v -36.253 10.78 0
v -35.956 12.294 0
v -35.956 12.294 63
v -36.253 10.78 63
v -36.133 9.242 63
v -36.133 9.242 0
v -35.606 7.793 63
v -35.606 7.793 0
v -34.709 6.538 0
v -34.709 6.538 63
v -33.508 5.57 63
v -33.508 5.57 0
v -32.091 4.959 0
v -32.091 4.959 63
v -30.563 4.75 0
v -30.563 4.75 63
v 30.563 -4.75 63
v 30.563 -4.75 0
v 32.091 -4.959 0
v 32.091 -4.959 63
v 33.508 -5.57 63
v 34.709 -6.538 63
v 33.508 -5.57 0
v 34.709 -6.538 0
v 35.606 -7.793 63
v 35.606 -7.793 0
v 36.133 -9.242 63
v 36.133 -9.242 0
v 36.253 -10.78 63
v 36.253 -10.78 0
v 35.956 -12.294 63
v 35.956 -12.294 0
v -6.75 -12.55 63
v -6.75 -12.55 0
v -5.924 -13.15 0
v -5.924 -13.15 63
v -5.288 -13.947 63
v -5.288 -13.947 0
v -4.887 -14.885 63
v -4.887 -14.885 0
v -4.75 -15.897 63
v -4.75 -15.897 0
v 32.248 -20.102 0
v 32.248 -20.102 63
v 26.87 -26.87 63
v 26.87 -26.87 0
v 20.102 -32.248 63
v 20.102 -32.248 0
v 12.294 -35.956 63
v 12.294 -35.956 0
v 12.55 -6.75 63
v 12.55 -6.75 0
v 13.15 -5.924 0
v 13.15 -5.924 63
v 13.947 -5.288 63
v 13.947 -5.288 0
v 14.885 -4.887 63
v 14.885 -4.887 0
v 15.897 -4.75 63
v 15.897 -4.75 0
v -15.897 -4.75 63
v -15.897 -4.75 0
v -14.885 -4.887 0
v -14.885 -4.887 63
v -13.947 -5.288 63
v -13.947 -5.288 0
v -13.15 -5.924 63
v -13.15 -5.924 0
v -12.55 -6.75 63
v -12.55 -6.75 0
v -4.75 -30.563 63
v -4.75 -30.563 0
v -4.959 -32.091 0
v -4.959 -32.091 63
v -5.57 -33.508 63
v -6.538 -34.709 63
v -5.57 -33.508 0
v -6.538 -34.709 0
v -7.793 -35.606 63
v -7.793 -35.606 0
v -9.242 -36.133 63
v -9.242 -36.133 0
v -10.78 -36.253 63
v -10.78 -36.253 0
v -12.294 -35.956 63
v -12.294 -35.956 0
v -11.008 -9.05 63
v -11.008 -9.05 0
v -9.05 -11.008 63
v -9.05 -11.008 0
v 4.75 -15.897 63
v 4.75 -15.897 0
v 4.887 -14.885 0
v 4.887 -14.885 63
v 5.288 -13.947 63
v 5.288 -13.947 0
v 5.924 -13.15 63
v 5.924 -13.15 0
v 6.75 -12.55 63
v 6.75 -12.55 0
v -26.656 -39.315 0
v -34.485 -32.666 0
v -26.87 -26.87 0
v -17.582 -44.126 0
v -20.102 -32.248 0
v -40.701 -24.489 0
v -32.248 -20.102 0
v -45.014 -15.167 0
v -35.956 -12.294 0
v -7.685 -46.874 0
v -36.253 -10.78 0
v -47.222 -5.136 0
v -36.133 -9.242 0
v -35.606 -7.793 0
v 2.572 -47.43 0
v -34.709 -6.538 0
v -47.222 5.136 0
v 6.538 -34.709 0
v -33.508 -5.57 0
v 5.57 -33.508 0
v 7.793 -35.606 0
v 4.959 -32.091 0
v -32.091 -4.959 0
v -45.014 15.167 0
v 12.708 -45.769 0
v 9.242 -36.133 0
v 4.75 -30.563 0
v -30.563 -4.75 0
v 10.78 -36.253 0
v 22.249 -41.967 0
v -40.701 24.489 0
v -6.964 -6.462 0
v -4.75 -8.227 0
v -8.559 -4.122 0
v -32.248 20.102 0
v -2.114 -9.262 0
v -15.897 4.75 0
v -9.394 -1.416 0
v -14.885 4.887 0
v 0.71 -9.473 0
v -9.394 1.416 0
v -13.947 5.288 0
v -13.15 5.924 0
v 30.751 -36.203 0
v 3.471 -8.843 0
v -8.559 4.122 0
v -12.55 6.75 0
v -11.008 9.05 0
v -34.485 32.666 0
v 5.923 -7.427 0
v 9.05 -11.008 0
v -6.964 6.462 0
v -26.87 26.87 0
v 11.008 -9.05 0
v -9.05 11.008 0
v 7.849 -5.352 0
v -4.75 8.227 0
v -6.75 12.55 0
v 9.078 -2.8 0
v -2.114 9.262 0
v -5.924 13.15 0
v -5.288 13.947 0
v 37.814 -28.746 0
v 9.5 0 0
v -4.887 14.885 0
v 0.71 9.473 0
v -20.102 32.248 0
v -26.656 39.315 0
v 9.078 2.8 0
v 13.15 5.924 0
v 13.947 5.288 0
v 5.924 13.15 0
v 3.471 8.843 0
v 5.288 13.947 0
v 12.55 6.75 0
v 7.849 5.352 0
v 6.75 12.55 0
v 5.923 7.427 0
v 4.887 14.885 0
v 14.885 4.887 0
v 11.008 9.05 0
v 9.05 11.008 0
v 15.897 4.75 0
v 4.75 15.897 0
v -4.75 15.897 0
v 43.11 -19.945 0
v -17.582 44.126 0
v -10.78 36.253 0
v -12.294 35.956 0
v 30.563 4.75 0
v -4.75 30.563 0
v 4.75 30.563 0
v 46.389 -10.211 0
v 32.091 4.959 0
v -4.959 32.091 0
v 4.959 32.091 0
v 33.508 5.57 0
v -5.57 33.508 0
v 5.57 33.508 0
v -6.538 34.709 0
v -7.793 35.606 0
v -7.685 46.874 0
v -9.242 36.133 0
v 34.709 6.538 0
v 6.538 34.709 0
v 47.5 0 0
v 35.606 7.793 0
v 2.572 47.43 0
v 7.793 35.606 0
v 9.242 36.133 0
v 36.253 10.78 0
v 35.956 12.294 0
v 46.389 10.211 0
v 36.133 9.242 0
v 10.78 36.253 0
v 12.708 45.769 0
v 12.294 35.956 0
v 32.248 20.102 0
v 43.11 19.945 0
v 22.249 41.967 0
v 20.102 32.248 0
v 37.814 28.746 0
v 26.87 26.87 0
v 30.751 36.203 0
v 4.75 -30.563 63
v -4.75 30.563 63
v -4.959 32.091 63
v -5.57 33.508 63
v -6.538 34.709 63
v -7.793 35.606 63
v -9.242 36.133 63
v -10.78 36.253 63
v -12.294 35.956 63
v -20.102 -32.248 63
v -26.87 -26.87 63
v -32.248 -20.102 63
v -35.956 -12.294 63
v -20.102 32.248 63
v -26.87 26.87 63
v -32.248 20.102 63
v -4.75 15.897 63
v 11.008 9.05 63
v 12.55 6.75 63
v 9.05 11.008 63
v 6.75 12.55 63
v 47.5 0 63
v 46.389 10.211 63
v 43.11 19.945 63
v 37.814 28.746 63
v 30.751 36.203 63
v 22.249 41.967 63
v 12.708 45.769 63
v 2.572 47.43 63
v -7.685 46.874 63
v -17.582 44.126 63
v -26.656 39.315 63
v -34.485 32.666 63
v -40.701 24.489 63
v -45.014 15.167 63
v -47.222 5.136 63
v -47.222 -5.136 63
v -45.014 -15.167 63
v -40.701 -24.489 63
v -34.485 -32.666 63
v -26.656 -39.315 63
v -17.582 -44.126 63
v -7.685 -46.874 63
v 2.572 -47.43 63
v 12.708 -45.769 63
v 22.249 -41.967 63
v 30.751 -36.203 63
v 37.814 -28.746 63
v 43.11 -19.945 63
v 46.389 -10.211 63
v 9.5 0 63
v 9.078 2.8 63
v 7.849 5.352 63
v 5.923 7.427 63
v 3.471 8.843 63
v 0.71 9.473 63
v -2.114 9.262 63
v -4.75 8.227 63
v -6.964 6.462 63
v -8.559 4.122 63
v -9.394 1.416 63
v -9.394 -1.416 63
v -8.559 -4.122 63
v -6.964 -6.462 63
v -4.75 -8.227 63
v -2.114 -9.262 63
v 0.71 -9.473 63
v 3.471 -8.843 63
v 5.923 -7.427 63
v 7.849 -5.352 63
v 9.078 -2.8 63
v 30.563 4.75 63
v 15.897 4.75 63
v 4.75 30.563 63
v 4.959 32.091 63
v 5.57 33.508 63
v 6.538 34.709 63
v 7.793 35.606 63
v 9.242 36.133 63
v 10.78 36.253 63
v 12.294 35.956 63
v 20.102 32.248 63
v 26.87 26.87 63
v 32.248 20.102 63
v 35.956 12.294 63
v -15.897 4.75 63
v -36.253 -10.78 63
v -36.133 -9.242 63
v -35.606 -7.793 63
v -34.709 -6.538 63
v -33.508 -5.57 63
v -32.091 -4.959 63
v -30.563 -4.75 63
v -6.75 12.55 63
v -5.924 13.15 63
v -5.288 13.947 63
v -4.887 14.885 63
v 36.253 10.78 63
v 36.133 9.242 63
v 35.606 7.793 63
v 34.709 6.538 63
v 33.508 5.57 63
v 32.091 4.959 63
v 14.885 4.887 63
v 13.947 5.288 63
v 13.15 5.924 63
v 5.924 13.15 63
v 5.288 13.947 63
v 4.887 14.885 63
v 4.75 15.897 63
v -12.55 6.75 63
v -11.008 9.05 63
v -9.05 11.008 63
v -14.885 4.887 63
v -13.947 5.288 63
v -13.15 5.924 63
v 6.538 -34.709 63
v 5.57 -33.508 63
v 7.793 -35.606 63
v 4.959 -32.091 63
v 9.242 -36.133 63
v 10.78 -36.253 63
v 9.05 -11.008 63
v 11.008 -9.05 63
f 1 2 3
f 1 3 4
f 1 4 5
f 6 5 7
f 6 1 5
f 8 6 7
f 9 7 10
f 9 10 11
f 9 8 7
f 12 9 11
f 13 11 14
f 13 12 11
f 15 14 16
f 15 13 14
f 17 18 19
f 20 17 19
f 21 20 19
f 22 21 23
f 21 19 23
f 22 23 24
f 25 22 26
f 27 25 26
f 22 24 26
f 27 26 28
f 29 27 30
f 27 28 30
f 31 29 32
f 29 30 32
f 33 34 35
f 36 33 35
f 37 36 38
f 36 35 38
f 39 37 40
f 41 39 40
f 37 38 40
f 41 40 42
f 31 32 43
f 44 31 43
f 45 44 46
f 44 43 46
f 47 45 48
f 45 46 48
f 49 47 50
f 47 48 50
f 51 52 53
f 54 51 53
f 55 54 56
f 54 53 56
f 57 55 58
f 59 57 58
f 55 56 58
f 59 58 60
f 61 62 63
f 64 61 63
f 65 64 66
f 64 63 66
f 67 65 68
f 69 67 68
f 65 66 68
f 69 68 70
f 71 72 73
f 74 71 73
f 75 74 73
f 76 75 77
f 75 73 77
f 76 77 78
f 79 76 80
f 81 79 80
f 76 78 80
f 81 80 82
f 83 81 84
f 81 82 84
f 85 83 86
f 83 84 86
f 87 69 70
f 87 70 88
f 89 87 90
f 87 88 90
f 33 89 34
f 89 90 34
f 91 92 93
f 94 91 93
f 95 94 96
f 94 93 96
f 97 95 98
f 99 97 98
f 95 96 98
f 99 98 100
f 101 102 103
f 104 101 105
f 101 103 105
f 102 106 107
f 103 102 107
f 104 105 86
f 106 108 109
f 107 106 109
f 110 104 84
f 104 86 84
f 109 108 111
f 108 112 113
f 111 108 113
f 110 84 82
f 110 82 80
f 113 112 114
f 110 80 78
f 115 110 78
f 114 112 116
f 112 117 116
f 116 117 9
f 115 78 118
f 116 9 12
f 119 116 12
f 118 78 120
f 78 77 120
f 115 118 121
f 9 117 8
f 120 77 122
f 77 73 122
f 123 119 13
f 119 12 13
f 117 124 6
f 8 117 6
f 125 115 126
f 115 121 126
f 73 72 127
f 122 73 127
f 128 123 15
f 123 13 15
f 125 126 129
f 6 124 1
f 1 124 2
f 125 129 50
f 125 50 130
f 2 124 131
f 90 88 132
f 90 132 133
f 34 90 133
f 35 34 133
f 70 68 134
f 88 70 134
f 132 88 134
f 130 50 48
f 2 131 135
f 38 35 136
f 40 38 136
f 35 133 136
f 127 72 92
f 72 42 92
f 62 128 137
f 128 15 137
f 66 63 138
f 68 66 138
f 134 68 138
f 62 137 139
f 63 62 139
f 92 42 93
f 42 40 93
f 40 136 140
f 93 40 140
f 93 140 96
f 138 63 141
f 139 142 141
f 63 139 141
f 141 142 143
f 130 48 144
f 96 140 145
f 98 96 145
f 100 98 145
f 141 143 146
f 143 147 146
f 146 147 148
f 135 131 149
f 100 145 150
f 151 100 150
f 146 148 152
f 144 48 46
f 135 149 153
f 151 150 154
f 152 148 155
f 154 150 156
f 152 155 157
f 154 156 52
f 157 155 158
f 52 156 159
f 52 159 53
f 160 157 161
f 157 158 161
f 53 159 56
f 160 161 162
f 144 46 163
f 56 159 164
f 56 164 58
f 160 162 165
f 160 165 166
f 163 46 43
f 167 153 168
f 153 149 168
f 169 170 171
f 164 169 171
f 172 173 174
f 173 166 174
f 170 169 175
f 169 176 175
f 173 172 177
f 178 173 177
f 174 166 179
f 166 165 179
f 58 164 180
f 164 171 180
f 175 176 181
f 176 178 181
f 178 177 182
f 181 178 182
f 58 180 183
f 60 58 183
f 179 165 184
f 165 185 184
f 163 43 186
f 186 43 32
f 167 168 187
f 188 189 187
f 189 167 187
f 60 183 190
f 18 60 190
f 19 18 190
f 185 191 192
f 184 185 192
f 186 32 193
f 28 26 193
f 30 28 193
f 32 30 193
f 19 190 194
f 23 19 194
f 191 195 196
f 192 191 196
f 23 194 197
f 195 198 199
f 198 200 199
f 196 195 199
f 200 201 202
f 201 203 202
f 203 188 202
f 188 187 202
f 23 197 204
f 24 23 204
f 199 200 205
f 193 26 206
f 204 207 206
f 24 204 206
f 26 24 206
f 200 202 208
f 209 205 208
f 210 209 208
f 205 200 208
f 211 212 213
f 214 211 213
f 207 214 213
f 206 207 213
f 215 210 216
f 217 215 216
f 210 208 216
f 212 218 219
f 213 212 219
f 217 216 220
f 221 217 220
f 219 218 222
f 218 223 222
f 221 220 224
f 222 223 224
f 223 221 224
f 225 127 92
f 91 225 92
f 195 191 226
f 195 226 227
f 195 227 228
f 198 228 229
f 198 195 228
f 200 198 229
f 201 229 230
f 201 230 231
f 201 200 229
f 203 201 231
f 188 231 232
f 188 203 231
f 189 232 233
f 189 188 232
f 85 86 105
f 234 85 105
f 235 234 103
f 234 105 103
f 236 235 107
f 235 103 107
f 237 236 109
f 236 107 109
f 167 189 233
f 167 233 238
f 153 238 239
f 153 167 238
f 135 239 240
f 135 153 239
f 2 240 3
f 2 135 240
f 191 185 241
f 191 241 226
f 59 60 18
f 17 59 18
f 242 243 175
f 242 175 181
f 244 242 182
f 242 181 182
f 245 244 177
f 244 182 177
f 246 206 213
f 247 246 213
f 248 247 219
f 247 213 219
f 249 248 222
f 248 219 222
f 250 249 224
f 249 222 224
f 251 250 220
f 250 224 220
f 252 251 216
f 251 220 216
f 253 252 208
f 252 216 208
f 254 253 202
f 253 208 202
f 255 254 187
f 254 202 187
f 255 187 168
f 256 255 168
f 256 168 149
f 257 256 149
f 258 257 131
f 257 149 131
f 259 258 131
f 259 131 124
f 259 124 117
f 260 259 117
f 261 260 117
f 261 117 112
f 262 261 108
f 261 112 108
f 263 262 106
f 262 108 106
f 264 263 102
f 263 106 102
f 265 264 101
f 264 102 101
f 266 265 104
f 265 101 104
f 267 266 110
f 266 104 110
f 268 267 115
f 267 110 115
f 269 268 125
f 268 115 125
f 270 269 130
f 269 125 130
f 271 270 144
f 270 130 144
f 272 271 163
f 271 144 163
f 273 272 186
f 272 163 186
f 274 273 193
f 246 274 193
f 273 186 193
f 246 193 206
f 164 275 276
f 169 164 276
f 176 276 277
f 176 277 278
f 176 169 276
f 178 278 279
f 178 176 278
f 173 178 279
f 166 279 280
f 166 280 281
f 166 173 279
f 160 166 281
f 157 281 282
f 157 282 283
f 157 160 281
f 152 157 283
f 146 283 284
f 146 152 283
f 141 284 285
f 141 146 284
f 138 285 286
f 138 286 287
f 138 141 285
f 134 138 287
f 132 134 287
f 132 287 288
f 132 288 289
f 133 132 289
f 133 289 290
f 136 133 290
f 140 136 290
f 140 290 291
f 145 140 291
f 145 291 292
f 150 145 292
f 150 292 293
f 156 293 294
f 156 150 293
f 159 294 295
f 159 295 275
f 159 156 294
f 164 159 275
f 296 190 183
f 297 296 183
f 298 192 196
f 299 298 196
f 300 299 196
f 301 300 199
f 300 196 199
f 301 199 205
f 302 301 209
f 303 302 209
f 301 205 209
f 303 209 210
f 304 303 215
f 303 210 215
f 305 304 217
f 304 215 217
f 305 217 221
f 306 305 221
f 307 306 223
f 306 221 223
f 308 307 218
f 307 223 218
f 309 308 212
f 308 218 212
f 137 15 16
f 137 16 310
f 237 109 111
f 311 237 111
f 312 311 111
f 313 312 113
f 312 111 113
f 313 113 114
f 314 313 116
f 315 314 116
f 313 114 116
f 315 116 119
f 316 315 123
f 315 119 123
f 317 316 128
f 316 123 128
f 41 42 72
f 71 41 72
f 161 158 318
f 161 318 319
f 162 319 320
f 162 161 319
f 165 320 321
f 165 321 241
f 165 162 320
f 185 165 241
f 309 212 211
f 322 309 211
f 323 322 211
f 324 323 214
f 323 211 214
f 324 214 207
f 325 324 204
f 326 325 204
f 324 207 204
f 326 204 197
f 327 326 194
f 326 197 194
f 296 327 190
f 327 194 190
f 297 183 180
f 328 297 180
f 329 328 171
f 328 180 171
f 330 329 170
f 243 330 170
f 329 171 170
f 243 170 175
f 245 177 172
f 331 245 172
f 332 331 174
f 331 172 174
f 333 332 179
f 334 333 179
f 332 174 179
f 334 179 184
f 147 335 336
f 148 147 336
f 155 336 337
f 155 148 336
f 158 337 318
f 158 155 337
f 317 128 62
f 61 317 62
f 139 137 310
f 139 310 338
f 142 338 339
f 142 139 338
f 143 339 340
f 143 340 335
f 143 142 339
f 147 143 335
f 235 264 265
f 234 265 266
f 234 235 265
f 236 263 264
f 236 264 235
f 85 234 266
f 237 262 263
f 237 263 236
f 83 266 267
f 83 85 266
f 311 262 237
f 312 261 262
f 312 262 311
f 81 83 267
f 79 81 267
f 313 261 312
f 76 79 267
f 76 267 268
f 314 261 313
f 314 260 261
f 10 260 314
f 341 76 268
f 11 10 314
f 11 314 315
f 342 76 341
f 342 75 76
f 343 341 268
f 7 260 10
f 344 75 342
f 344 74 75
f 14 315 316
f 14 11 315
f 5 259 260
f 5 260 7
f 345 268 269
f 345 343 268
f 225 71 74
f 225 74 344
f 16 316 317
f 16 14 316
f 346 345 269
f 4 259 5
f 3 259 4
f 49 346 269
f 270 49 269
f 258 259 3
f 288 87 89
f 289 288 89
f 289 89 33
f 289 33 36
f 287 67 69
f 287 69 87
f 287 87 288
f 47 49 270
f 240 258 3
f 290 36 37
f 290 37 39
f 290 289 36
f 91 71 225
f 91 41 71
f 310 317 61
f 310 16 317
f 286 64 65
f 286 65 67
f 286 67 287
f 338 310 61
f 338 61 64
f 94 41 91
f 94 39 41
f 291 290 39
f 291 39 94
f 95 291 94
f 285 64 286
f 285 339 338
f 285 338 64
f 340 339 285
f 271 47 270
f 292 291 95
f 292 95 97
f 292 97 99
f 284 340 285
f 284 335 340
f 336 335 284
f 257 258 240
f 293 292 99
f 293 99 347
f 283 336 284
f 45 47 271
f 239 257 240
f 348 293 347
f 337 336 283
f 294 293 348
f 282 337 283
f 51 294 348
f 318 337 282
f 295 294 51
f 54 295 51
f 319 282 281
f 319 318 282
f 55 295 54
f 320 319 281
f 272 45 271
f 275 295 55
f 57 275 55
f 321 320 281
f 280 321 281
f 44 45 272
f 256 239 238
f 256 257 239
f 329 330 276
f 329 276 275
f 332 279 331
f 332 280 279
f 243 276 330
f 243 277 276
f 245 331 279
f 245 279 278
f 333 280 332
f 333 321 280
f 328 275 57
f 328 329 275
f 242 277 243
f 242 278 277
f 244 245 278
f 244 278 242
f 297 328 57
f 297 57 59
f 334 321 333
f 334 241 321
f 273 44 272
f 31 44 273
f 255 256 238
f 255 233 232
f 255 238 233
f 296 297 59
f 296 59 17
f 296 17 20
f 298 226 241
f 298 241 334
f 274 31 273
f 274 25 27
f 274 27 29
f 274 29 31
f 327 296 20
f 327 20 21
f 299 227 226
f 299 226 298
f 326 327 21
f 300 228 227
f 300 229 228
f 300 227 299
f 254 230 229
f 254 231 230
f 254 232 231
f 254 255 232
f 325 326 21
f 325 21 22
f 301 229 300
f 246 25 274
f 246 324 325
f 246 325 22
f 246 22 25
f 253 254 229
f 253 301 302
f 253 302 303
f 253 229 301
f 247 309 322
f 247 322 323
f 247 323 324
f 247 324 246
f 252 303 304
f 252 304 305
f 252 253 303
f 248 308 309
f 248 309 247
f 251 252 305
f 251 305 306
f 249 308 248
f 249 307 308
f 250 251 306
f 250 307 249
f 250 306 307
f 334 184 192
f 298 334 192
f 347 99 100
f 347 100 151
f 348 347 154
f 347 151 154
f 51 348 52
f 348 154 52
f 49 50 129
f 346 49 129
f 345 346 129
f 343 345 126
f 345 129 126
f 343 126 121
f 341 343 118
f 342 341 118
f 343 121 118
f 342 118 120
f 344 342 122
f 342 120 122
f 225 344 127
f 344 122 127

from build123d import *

# Parameters (mm, degrees)
IZIM1_R                     = 47.5
IZIM1_R_2                   = 9.5
Y_KSEKLIK_EKSTR_ZYON1_DEPTH = 63


with BuildPart() as part:
    # Çizim1 → Yükseklik-Ekstrüzyon1 (new body)
    with BuildSketch(Plane.XY):
        Circle(IZIM1_R)
        Circle(IZIM1_R_2, mode=Mode.SUBTRACT)
        with BuildLine():
            Line((30.56284509, 4.75), (15.896540504, 4.75))
            ThreePointArc((15.896540504, 4.75), (13.947181635, 5.288098714), (12.549900398, 6.75))
            ThreePointArc((12.549900398, 6.75), (10.076271632, 10.076271632), (6.75, 12.549900398))
            ThreePointArc((6.75, 12.549900398), (5.288098714, 13.947181635), (4.75, 15.896540504))
            Line((4.75, 15.896540504), (4.75, 30.56284509))
            ThreePointArc((4.75, 30.56284509), (7.134994011, 35.199733626), (12.294117647, 35.956288341))
            ThreePointArc((12.294117647, 35.956288341), (26.870057685, 26.870057685), (35.956288341, 12.294117647))
            ThreePointArc((35.956288341, 12.294117647), (35.199733626, 7.134994011), (30.56284509, 4.75))
        make_face(mode=Mode.SUBTRACT)
        with BuildLine():
            Line((-30.56284509, 4.75), (-15.896540504, 4.75))
            ThreePointArc((-15.896540504, 4.75), (-13.947181635, 5.288098714), (-12.549900398, 6.75))
            ThreePointArc((-12.549900398, 6.75), (-10.076271632, 10.076271632), (-6.75, 12.549900398))
            ThreePointArc((-6.75, 12.549900398), (-5.288098714, 13.947181635), (-4.75, 15.896540504))
            Line((-4.75, 15.896540504), (-4.75, 30.56284509))
            ThreePointArc((-4.75, 30.56284509), (-7.134994011, 35.199733626), (-12.294117647, 35.956288341))
            ThreePointArc((-12.294117647, 35.956288341), (-26.870057685, 26.870057685), (-35.956288341, 12.294117647))
            ThreePointArc((-35.956288341, 12.294117647), (-35.199733626, 7.134994011), (-30.56284509, 4.75))
        make_face(mode=Mode.SUBTRACT)
        with BuildLine():
            Line((4.75, -30.56284509), (4.75, -15.896540504))
            ThreePointArc((4.75, -15.896540504), (5.288098714, -13.947181635), (6.75, -12.549900398))
            ThreePointArc((6.75, -12.549900398), (10.076271632, -10.076271632), (12.549900398, -6.75))
            ThreePointArc((12.549900398, -6.75), (13.947181635, -5.288098714), (15.896540504, -4.75))
            Line((15.896540504, -4.75), (30.56284509, -4.75))
            ThreePointArc((30.56284509, -4.75), (35.199733626, -7.134994011), (35.956288341, -12.294117647))
            ThreePointArc((35.956288341, -12.294117647), (26.870057685, -26.870057685), (12.294117647, -35.956288341))
            ThreePointArc((12.294117647, -35.956288341), (7.134994011, -35.199733626), (4.75, -30.56284509))
        make_face(mode=Mode.SUBTRACT)
        with BuildLine():
            Line((-30.56284509, -4.75), (-15.896540504, -4.75))
            ThreePointArc((-15.896540504, -4.75), (-13.947181635, -5.288098714), (-12.549900398, -6.75))
            ThreePointArc((-12.549900398, -6.75), (-10.076271632, -10.076271632), (-6.75, -12.549900398))
            ThreePointArc((-6.75, -12.549900398), (-5.288098714, -13.947181635), (-4.75, -15.896540504))
            Line((-4.75, -15.896540504), (-4.75, -30.56284509))
            ThreePointArc((-4.75, -30.56284509), (-7.134994011, -35.199733626), (-12.294117647, -35.956288341))
            ThreePointArc((-12.294117647, -35.956288341), (-26.870057685, -26.870057685), (-35.956288341, -12.294117647))
            ThreePointArc((-35.956288341, -12.294117647), (-35.199733626, -7.134994011), (-30.56284509, -4.75))
        make_face(mode=Mode.SUBTRACT)
    extrude(amount=Y_KSEKLIK_EKSTR_ZYON1_DEPTH)


solid = part.part
